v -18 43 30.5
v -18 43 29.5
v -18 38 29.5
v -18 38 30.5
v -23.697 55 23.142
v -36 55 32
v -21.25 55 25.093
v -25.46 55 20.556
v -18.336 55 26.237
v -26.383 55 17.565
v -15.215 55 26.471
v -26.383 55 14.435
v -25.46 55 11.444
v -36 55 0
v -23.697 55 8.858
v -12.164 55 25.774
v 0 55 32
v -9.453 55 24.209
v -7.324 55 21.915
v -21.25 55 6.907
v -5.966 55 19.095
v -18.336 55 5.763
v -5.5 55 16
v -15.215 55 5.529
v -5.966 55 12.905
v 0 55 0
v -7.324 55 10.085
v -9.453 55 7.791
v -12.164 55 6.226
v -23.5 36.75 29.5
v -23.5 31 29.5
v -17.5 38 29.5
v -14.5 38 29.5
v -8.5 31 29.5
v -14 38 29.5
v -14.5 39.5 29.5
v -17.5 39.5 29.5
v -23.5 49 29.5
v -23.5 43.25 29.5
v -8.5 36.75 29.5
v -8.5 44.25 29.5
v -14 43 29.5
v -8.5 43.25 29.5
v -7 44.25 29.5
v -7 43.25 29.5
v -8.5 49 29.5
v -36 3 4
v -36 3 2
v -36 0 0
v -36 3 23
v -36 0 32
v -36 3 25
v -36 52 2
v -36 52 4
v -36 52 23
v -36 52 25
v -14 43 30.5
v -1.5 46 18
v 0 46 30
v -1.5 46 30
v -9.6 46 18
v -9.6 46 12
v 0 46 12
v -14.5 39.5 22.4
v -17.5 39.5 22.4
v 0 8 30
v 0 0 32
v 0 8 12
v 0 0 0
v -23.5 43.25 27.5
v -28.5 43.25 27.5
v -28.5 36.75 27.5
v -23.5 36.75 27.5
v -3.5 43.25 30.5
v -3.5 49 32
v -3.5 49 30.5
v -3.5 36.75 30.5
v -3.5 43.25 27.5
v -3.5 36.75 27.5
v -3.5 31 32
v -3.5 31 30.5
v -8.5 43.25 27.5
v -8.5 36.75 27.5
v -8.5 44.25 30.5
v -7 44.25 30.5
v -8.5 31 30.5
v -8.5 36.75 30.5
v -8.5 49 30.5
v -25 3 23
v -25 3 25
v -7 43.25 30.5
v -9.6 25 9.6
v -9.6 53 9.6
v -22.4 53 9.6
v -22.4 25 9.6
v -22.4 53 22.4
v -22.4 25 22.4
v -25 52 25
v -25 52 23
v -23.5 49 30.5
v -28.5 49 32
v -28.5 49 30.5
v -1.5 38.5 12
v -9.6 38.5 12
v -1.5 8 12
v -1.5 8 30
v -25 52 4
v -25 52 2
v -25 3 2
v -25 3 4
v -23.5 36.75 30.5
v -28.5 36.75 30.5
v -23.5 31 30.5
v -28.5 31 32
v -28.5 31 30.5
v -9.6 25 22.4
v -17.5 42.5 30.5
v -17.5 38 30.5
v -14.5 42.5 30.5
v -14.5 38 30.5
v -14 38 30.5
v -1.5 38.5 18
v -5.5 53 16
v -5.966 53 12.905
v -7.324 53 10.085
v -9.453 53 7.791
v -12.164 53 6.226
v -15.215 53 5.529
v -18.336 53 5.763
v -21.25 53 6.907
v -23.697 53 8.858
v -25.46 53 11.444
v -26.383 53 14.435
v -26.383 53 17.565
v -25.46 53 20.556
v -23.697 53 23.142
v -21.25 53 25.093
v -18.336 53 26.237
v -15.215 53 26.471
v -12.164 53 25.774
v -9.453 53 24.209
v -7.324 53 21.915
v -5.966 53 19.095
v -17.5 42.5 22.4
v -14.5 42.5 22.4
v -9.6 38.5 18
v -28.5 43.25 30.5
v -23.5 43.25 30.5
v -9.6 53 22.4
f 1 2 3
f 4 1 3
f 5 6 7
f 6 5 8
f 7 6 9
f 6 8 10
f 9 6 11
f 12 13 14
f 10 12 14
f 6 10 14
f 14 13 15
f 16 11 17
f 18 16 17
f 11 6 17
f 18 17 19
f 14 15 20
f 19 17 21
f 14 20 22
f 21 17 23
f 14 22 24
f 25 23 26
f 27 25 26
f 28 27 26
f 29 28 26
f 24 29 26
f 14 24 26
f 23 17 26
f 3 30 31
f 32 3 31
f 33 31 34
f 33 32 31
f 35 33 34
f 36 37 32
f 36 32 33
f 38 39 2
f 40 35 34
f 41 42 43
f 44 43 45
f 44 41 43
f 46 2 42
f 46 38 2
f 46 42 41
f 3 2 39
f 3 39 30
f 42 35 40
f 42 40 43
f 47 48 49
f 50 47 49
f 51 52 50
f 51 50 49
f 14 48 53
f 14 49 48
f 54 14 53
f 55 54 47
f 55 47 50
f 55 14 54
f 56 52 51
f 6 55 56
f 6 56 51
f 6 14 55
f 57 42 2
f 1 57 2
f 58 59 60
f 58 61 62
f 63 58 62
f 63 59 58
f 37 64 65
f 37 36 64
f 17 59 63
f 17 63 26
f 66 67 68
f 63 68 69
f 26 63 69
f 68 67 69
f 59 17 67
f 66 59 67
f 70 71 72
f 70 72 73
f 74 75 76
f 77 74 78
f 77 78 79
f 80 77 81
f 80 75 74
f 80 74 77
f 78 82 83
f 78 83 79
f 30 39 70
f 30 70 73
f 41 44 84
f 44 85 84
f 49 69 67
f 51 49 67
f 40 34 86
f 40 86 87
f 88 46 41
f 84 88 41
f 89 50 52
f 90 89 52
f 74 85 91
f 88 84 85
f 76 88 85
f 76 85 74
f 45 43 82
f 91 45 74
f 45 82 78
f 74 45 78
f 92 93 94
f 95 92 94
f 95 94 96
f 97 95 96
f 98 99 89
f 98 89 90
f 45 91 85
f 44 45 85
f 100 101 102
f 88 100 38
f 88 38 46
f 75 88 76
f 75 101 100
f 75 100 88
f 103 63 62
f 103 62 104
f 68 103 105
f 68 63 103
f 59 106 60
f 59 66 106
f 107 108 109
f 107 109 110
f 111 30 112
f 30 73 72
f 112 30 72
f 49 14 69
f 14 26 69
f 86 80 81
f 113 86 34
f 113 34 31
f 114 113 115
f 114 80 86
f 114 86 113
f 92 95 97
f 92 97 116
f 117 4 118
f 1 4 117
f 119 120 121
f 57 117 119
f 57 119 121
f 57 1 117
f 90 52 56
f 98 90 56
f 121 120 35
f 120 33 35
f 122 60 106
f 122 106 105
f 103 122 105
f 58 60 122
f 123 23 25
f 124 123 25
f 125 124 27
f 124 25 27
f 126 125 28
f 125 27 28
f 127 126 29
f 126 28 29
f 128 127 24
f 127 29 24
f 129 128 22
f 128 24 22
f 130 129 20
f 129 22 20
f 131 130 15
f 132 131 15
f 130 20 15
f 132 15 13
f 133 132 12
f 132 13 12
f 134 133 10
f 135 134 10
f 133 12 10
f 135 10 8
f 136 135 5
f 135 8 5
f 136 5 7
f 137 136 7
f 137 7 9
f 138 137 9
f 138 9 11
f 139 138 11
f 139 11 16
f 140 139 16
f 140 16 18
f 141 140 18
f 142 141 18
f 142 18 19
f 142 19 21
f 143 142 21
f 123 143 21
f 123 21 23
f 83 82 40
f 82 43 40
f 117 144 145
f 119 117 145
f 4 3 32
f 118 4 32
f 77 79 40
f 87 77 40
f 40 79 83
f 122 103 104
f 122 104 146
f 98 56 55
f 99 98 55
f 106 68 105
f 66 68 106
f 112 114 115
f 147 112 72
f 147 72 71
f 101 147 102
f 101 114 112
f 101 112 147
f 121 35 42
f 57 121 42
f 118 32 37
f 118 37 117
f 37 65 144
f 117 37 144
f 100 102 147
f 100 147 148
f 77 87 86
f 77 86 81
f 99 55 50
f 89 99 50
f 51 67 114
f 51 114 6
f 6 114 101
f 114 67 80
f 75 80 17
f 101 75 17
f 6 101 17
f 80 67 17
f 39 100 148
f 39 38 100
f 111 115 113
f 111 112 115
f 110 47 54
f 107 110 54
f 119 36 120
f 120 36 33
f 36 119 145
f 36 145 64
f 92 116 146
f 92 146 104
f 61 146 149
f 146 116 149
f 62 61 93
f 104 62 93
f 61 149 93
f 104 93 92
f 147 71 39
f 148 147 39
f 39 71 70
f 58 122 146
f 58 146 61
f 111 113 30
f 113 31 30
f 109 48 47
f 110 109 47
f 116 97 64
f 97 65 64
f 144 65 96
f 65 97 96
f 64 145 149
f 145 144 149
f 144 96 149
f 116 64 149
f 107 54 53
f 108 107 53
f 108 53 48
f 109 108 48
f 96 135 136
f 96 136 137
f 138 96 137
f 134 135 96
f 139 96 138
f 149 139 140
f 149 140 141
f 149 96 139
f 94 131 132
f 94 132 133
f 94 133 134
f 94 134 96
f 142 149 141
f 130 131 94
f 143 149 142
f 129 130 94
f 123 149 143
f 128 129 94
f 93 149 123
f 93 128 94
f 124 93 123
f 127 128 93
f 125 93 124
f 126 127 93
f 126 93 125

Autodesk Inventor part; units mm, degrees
ref_plane "YZ Plane" through (0, 0, 0) normal (1, 0, 0) x (0, 1, 0)
ref_plane "XZ Plane" through (0, 0, 0) normal (0, 1, 0) x (-1, 0, 0)
ref_plane "XY Plane" through (0, 0, 0) normal (0, 0, 1) x (1, 0, 0)
sketch "Sketch1" plane through (0, 0, 0) normal (0, 1, 0) x (-1, 0, 0)
  line L0 (32, 32) -> (0, 32)
  line L1 (0, 32) -> (0, 0)
  line L2 (0, 0) -> (32, 0)
  line L3 (32, 0) -> (32, 32)
extrude "Extrusion1" add sketch "Sketch1" along normal blind 55
sketch "Sketch2" plane through (0, 55, 0) normal (0, 1, 0) x (1, 0, 0)
  line L0 (-9.6, -9.6) -> (-22.4, -9.6)
  line L1 (-22.4, -9.6) -> (-22.4, -22.4)
  line L2 (-22.4, -22.4) -> (-9.6, -22.4)
  line L3 (-9.6, -22.4) -> (-9.6, -9.6)
  point P0 (0, 0)
extrude "Extrusion2" cut sketch "Sketch2" against normal blind 30
sketch "Sketch3" plane through (-32, 0, 32) normal (0, 0, 1) x (1, 0, 0)
  line L0 (3.5, 49) -> (28.5, 49)
  line L1 (28.5, 49) -> (28.5, 31)
  line L2 (28.5, 31) -> (3.5, 31)
  line L3 (3.5, 31) -> (3.5, 49)
  line L4 (3.5, 49) -> (3.5, 43.25)
  line L5 (3.5, 36.75) -> (3.5, 43.25)
  line L6 (28.5, 49) -> (28.5, 43.25)
  line L7 (28.5, 36.75) -> (28.5, 43.25)
  line L8 (3.5, 43.25) -> (3.5, 36.75)
  line L9 (28.5, 43.25) -> (28.5, 36.75)
  point P0 (32, 0)
extrude "Extrusion3" cut sketch "Sketch3" against normal blind 2.5
sketch "Sketch4" plane through (-32, 0, 29.5) normal (0, 0, 1) x (1, 0, 0)
  line L0 (3.5, 49) -> (28.5, 49) projected
  line L1 (3.5, 49) -> (3.5, 43.25)
  line L2 (28.5, 31) -> (3.5, 31) projected
  line L3 (3.5, 36.75) -> (3.5, 31)
  line L4 (3.5, 31) -> (28.5, 31)
  line L5 (28.5, 31) -> (28.5, 36.75)
  line L6 (28.5, 49) -> (28.5, 31) projected
  line L7 (28.5, 43.25) -> (28.5, 49)
  line L8 (28.5, 49) -> (3.5, 49)
  point P0 (32, 0)
sketch "Sketch5" plane through (-32, 0, 29.5) normal (0, 0, 1) x (1, 0, 0)
  line L0 (3.5, 43.25) -> (8.5, 43.25)
  line L1 (8.5, 43.25) -> (8.5, 36.75)
  line L2 (8.5, 36.75) -> (3.5, 36.75)
  line L3 (3.5, 36.75) -> (3.5, 43.25)
  point P0 (32, 0)
sketch "Sketch6" plane through (-32, 0, 29.5) normal (0, 0, 1) x (1, 0, 0)
  line L0 (28.5, 43.25) -> (23.5, 43.25)
  line L1 (23.5, 43.25) -> (23.5, 36.75)
  line L2 (23.5, 36.75) -> (28.5, 36.75)
  line L3 (28.5, 36.75) -> (28.5, 43.25)
  point P0 (32, 0)
extrude "Extrusion4" cut sketch "Sketch5" against normal blind 2
extrude "Extrusion5" cut sketch "Sketch6" against normal blind 2
sketch "Sketch7" plane through (-32, 0, 29.5) normal (0, 0, 1) x (1, 0, 0)
  line L0 (3.5, 43.25) -> (8.5, 43.25) projected
  line L1 (3.5, 43.25) -> (3.5, 49) projected
  line L2 (8.5, 43.25) -> (3.5, 43.25)
  line L3 (3.5, 43.25) -> (3.5, 49)
  line L4 (3.5, 49) -> (8.5, 49)
  line L5 (8.5, 49) -> (8.5, 43.25)
  point P0 (32, 0)
sketch "Sketch8" plane through (-32, 0, 29.5) normal (0, 0, 1) x (1, 0, 0)
  line L0 (8.5, 36.75) -> (3.5, 36.75) projected
  line L1 (28.5, 31) -> (3.5, 31) projected
  line L2 (8.5, 36.75) -> (3.5, 36.75)
  line L3 (3.5, 36.75) -> (3.5, 31)
  line L4 (3.5, 31) -> (8.5, 31)
  line L5 (8.5, 31) -> (8.5, 36.75)
  point P0 (32, 0)
sketch "Sketch9" plane through (-32, 0, 29.5) normal (0, 0, 1) x (1, 0, 0)
  line L0 (28.5, 36.75) -> (23.5, 36.75) projected
  line L1 (28.5, 31) -> (3.5, 31) projected
  line L2 (23.5, 36.75) -> (28.5, 36.75)
  line L3 (28.5, 36.75) -> (28.5, 31)
  line L4 (28.5, 31) -> (23.5, 31)
  line L5 (23.5, 31) -> (23.5, 36.75)
  point P0 (32, 0)
sketch "Sketch10" plane through (-32, 0, 29.5) normal (0, 0, 1) x (1, 0, 0)
  line L0 (23.5, 43.25) -> (28.5, 43.25) projected
  line L1 (28.5, 49) -> (28.5, 43.25) projected
  line L2 (23.5, 43.25) -> (28.5, 43.25)
  line L3 (28.5, 43.25) -> (28.5, 49)
  line L4 (28.5, 49) -> (23.5, 49)
  line L5 (23.5, 49) -> (23.5, 43.25)
  point P0 (32, 0)
extrude "Extrusion6" add sketch "Sketch7" along normal blind 1
extrude "Extrusion7" add sketch "Sketch8" along normal blind 1
extrude "Extrusion8" add sketch "Sketch9" along normal blind 1
extrude "Extrusion9" add sketch "Sketch10" along normal blind 1
sketch "Sketch11" plane through (-32, 0, 30.5) normal (0, 0, 1) x (1, 0, 0)
  line L0 (23.5, 43.25) -> (28.5, 43.25) projected
  line L1 (23.5, 43.25) -> (25, 43.25)
  line L2 (25, 43.25) -> (25, 44.25)
  line L3 (25, 44.25) -> (23.5, 44.25)
  line L4 (23.5, 44.25) -> (23.5, 43.25)
  point P0 (32, 0)
extrude "Extrusion10" cut sketch "Sketch11" against normal blind 1
sketch "Sketch12" plane through (-32, 0, 29.5) normal (0, 0, 1) x (1, 0, 0)
  line L0 (8.5, 49) -> (8.5, 43.25) projected
  line L1 (23.5, 31) -> (8.5, 31) projected
  line L2 (23.5, 49) -> (23.5, 44.25) projected
  point P0 (32, 0)
sketch "Sketch13" plane through (-32, 0, 29.5) normal (0, 0, 1) x (1, 0, 0)
  point P0 (32, 0)
sketch "Sketch14" plane through (-32, 0, 29.5) normal (0, 0, 1) x (1, 0, 0)
  line L0 (23.5, 44.25) -> (23.5, 49) projected
  line L1 (23.5, 49) -> (17.5, 49)
  line L2 (14.5, 43) -> (17.5, 43)
  line L3 (17.5, 38) -> (18, 38)
  line L4 (18, 38) -> (18, 43)
  line L5 (18, 43) -> (14, 43)
  line L6 (14, 43) -> (14, 38)
  line L7 (14, 38) -> (14.5, 38)
  line L8 (14.5, 38) -> (14.5, 42)
  line L9 (3.5, 43.25) -> (8.5, 43.25) projected
  line L10 (14.5, 42) -> (14.5, 42.5)
  line L11 (14.5, 42.5) -> (17.5, 42.5)
  line L12 (17.5, 42.5) -> (17.5, 38)
  point P0 (32, 0)
extrude "Extrusion11" add sketch "Sketch14" along normal blind 1
sketch "Sketch15" plane through (-32, 0, 29.5) normal (0, 0, 1) x (1, 0, 0)
  line L0 (14.5, 42.5) -> (14.5, 38) projected
  line L1 (14.5, 42.5) -> (17.5, 42.5)
  line L2 (17.5, 42.5) -> (17.5, 39.5)
  line L3 (17.5, 39.5) -> (14.5, 39.5)
  line L4 (14.5, 39.5) -> (14.5, 42.5)
  point P0 (32, 0)
extrude "Extrusion12" cut sketch "Sketch15" against normal blind 7.1
sketch "Sketch16" plane through (-32, 0, 32) normal (0, 0, 1) x (1, 0, 0)
  point P0 (32, 0)
sketch "Sketch17" plane through (0, 0, 32) normal (1, 0, 0) x (0, 0, -1)
  line L0 (2, 46) -> (20, 46)
  line L1 (20, 46) -> (20, 8)
  line L2 (20, 8) -> (2, 8)
  line L3 (2, 8) -> (2, 46)
  point P0 (32, 0)
extrude "Extrusion13" cut sketch "Sketch17" against normal blind 1.5
sketch "Sketch18" plane through (-1.5, 0, 32) normal (1, 0, 0) x (0, 0, -1)
  line L0 (20, 38.5) -> (14, 38.5)
  line L1 (14, 38.5) -> (14, 46)
  line L2 (14, 46) -> (20, 46)
  line L3 (20, 46) -> (20, 38.5)
  point P0 (32, 0)
extrude "Extrusion14" cut sketch "Sketch18" against normal blind 8.1
sketch "Sketch19" plane through (0, 55, 0) normal (0, 1, 0) x (1, 0, 0)
  circle A0 centre (-16, -16) radius 10.5
  point P0 (0, 0)
sketch "Sketch20" plane through (0, 55, 0) normal (0, 1, 0) x (1, 0, 0)
  point P0 (0, 0)
extrude "Extrusion15" cut sketch "Sketch19" against normal blind 2
sketch "Sketch21" plane through (-32, 0, 0) normal (-1, 0, 0) x (0, 0, 1)
  line L0 (32, 0) -> (32, 55) projected
  line L1 (0, 0) -> (32, 0)
  line L2 (32, 0) -> (32, 55)
  line L3 (32, 55) -> (0, 55)
  line L4 (0, 55) -> (0, 0)
extrude "Extrusion16" add sketch "Sketch21" along normal blind 4
sketch "Sketch22" plane through (-36, 0, 0) normal (-1, 0, 0) x (0, 0, 1)
  line L0 (2, 3) -> (4, 3)
  line L1 (4, 3) -> (4, 52)
  line L2 (4, 52) -> (2, 52)
  line L3 (2, 52) -> (2, 3)
  line L4 (23, 3) -> (25, 3)
  line L5 (25, 3) -> (25, 52)
  line L6 (25, 52) -> (23, 52)
  line L7 (23, 52) -> (23, 3)
  point P0 (0, 0)
extrude "Extrusion17" cut sketch "Sketch22" against normal blind 11
properties part number "Cuvette Holder v2_3DPrint"
